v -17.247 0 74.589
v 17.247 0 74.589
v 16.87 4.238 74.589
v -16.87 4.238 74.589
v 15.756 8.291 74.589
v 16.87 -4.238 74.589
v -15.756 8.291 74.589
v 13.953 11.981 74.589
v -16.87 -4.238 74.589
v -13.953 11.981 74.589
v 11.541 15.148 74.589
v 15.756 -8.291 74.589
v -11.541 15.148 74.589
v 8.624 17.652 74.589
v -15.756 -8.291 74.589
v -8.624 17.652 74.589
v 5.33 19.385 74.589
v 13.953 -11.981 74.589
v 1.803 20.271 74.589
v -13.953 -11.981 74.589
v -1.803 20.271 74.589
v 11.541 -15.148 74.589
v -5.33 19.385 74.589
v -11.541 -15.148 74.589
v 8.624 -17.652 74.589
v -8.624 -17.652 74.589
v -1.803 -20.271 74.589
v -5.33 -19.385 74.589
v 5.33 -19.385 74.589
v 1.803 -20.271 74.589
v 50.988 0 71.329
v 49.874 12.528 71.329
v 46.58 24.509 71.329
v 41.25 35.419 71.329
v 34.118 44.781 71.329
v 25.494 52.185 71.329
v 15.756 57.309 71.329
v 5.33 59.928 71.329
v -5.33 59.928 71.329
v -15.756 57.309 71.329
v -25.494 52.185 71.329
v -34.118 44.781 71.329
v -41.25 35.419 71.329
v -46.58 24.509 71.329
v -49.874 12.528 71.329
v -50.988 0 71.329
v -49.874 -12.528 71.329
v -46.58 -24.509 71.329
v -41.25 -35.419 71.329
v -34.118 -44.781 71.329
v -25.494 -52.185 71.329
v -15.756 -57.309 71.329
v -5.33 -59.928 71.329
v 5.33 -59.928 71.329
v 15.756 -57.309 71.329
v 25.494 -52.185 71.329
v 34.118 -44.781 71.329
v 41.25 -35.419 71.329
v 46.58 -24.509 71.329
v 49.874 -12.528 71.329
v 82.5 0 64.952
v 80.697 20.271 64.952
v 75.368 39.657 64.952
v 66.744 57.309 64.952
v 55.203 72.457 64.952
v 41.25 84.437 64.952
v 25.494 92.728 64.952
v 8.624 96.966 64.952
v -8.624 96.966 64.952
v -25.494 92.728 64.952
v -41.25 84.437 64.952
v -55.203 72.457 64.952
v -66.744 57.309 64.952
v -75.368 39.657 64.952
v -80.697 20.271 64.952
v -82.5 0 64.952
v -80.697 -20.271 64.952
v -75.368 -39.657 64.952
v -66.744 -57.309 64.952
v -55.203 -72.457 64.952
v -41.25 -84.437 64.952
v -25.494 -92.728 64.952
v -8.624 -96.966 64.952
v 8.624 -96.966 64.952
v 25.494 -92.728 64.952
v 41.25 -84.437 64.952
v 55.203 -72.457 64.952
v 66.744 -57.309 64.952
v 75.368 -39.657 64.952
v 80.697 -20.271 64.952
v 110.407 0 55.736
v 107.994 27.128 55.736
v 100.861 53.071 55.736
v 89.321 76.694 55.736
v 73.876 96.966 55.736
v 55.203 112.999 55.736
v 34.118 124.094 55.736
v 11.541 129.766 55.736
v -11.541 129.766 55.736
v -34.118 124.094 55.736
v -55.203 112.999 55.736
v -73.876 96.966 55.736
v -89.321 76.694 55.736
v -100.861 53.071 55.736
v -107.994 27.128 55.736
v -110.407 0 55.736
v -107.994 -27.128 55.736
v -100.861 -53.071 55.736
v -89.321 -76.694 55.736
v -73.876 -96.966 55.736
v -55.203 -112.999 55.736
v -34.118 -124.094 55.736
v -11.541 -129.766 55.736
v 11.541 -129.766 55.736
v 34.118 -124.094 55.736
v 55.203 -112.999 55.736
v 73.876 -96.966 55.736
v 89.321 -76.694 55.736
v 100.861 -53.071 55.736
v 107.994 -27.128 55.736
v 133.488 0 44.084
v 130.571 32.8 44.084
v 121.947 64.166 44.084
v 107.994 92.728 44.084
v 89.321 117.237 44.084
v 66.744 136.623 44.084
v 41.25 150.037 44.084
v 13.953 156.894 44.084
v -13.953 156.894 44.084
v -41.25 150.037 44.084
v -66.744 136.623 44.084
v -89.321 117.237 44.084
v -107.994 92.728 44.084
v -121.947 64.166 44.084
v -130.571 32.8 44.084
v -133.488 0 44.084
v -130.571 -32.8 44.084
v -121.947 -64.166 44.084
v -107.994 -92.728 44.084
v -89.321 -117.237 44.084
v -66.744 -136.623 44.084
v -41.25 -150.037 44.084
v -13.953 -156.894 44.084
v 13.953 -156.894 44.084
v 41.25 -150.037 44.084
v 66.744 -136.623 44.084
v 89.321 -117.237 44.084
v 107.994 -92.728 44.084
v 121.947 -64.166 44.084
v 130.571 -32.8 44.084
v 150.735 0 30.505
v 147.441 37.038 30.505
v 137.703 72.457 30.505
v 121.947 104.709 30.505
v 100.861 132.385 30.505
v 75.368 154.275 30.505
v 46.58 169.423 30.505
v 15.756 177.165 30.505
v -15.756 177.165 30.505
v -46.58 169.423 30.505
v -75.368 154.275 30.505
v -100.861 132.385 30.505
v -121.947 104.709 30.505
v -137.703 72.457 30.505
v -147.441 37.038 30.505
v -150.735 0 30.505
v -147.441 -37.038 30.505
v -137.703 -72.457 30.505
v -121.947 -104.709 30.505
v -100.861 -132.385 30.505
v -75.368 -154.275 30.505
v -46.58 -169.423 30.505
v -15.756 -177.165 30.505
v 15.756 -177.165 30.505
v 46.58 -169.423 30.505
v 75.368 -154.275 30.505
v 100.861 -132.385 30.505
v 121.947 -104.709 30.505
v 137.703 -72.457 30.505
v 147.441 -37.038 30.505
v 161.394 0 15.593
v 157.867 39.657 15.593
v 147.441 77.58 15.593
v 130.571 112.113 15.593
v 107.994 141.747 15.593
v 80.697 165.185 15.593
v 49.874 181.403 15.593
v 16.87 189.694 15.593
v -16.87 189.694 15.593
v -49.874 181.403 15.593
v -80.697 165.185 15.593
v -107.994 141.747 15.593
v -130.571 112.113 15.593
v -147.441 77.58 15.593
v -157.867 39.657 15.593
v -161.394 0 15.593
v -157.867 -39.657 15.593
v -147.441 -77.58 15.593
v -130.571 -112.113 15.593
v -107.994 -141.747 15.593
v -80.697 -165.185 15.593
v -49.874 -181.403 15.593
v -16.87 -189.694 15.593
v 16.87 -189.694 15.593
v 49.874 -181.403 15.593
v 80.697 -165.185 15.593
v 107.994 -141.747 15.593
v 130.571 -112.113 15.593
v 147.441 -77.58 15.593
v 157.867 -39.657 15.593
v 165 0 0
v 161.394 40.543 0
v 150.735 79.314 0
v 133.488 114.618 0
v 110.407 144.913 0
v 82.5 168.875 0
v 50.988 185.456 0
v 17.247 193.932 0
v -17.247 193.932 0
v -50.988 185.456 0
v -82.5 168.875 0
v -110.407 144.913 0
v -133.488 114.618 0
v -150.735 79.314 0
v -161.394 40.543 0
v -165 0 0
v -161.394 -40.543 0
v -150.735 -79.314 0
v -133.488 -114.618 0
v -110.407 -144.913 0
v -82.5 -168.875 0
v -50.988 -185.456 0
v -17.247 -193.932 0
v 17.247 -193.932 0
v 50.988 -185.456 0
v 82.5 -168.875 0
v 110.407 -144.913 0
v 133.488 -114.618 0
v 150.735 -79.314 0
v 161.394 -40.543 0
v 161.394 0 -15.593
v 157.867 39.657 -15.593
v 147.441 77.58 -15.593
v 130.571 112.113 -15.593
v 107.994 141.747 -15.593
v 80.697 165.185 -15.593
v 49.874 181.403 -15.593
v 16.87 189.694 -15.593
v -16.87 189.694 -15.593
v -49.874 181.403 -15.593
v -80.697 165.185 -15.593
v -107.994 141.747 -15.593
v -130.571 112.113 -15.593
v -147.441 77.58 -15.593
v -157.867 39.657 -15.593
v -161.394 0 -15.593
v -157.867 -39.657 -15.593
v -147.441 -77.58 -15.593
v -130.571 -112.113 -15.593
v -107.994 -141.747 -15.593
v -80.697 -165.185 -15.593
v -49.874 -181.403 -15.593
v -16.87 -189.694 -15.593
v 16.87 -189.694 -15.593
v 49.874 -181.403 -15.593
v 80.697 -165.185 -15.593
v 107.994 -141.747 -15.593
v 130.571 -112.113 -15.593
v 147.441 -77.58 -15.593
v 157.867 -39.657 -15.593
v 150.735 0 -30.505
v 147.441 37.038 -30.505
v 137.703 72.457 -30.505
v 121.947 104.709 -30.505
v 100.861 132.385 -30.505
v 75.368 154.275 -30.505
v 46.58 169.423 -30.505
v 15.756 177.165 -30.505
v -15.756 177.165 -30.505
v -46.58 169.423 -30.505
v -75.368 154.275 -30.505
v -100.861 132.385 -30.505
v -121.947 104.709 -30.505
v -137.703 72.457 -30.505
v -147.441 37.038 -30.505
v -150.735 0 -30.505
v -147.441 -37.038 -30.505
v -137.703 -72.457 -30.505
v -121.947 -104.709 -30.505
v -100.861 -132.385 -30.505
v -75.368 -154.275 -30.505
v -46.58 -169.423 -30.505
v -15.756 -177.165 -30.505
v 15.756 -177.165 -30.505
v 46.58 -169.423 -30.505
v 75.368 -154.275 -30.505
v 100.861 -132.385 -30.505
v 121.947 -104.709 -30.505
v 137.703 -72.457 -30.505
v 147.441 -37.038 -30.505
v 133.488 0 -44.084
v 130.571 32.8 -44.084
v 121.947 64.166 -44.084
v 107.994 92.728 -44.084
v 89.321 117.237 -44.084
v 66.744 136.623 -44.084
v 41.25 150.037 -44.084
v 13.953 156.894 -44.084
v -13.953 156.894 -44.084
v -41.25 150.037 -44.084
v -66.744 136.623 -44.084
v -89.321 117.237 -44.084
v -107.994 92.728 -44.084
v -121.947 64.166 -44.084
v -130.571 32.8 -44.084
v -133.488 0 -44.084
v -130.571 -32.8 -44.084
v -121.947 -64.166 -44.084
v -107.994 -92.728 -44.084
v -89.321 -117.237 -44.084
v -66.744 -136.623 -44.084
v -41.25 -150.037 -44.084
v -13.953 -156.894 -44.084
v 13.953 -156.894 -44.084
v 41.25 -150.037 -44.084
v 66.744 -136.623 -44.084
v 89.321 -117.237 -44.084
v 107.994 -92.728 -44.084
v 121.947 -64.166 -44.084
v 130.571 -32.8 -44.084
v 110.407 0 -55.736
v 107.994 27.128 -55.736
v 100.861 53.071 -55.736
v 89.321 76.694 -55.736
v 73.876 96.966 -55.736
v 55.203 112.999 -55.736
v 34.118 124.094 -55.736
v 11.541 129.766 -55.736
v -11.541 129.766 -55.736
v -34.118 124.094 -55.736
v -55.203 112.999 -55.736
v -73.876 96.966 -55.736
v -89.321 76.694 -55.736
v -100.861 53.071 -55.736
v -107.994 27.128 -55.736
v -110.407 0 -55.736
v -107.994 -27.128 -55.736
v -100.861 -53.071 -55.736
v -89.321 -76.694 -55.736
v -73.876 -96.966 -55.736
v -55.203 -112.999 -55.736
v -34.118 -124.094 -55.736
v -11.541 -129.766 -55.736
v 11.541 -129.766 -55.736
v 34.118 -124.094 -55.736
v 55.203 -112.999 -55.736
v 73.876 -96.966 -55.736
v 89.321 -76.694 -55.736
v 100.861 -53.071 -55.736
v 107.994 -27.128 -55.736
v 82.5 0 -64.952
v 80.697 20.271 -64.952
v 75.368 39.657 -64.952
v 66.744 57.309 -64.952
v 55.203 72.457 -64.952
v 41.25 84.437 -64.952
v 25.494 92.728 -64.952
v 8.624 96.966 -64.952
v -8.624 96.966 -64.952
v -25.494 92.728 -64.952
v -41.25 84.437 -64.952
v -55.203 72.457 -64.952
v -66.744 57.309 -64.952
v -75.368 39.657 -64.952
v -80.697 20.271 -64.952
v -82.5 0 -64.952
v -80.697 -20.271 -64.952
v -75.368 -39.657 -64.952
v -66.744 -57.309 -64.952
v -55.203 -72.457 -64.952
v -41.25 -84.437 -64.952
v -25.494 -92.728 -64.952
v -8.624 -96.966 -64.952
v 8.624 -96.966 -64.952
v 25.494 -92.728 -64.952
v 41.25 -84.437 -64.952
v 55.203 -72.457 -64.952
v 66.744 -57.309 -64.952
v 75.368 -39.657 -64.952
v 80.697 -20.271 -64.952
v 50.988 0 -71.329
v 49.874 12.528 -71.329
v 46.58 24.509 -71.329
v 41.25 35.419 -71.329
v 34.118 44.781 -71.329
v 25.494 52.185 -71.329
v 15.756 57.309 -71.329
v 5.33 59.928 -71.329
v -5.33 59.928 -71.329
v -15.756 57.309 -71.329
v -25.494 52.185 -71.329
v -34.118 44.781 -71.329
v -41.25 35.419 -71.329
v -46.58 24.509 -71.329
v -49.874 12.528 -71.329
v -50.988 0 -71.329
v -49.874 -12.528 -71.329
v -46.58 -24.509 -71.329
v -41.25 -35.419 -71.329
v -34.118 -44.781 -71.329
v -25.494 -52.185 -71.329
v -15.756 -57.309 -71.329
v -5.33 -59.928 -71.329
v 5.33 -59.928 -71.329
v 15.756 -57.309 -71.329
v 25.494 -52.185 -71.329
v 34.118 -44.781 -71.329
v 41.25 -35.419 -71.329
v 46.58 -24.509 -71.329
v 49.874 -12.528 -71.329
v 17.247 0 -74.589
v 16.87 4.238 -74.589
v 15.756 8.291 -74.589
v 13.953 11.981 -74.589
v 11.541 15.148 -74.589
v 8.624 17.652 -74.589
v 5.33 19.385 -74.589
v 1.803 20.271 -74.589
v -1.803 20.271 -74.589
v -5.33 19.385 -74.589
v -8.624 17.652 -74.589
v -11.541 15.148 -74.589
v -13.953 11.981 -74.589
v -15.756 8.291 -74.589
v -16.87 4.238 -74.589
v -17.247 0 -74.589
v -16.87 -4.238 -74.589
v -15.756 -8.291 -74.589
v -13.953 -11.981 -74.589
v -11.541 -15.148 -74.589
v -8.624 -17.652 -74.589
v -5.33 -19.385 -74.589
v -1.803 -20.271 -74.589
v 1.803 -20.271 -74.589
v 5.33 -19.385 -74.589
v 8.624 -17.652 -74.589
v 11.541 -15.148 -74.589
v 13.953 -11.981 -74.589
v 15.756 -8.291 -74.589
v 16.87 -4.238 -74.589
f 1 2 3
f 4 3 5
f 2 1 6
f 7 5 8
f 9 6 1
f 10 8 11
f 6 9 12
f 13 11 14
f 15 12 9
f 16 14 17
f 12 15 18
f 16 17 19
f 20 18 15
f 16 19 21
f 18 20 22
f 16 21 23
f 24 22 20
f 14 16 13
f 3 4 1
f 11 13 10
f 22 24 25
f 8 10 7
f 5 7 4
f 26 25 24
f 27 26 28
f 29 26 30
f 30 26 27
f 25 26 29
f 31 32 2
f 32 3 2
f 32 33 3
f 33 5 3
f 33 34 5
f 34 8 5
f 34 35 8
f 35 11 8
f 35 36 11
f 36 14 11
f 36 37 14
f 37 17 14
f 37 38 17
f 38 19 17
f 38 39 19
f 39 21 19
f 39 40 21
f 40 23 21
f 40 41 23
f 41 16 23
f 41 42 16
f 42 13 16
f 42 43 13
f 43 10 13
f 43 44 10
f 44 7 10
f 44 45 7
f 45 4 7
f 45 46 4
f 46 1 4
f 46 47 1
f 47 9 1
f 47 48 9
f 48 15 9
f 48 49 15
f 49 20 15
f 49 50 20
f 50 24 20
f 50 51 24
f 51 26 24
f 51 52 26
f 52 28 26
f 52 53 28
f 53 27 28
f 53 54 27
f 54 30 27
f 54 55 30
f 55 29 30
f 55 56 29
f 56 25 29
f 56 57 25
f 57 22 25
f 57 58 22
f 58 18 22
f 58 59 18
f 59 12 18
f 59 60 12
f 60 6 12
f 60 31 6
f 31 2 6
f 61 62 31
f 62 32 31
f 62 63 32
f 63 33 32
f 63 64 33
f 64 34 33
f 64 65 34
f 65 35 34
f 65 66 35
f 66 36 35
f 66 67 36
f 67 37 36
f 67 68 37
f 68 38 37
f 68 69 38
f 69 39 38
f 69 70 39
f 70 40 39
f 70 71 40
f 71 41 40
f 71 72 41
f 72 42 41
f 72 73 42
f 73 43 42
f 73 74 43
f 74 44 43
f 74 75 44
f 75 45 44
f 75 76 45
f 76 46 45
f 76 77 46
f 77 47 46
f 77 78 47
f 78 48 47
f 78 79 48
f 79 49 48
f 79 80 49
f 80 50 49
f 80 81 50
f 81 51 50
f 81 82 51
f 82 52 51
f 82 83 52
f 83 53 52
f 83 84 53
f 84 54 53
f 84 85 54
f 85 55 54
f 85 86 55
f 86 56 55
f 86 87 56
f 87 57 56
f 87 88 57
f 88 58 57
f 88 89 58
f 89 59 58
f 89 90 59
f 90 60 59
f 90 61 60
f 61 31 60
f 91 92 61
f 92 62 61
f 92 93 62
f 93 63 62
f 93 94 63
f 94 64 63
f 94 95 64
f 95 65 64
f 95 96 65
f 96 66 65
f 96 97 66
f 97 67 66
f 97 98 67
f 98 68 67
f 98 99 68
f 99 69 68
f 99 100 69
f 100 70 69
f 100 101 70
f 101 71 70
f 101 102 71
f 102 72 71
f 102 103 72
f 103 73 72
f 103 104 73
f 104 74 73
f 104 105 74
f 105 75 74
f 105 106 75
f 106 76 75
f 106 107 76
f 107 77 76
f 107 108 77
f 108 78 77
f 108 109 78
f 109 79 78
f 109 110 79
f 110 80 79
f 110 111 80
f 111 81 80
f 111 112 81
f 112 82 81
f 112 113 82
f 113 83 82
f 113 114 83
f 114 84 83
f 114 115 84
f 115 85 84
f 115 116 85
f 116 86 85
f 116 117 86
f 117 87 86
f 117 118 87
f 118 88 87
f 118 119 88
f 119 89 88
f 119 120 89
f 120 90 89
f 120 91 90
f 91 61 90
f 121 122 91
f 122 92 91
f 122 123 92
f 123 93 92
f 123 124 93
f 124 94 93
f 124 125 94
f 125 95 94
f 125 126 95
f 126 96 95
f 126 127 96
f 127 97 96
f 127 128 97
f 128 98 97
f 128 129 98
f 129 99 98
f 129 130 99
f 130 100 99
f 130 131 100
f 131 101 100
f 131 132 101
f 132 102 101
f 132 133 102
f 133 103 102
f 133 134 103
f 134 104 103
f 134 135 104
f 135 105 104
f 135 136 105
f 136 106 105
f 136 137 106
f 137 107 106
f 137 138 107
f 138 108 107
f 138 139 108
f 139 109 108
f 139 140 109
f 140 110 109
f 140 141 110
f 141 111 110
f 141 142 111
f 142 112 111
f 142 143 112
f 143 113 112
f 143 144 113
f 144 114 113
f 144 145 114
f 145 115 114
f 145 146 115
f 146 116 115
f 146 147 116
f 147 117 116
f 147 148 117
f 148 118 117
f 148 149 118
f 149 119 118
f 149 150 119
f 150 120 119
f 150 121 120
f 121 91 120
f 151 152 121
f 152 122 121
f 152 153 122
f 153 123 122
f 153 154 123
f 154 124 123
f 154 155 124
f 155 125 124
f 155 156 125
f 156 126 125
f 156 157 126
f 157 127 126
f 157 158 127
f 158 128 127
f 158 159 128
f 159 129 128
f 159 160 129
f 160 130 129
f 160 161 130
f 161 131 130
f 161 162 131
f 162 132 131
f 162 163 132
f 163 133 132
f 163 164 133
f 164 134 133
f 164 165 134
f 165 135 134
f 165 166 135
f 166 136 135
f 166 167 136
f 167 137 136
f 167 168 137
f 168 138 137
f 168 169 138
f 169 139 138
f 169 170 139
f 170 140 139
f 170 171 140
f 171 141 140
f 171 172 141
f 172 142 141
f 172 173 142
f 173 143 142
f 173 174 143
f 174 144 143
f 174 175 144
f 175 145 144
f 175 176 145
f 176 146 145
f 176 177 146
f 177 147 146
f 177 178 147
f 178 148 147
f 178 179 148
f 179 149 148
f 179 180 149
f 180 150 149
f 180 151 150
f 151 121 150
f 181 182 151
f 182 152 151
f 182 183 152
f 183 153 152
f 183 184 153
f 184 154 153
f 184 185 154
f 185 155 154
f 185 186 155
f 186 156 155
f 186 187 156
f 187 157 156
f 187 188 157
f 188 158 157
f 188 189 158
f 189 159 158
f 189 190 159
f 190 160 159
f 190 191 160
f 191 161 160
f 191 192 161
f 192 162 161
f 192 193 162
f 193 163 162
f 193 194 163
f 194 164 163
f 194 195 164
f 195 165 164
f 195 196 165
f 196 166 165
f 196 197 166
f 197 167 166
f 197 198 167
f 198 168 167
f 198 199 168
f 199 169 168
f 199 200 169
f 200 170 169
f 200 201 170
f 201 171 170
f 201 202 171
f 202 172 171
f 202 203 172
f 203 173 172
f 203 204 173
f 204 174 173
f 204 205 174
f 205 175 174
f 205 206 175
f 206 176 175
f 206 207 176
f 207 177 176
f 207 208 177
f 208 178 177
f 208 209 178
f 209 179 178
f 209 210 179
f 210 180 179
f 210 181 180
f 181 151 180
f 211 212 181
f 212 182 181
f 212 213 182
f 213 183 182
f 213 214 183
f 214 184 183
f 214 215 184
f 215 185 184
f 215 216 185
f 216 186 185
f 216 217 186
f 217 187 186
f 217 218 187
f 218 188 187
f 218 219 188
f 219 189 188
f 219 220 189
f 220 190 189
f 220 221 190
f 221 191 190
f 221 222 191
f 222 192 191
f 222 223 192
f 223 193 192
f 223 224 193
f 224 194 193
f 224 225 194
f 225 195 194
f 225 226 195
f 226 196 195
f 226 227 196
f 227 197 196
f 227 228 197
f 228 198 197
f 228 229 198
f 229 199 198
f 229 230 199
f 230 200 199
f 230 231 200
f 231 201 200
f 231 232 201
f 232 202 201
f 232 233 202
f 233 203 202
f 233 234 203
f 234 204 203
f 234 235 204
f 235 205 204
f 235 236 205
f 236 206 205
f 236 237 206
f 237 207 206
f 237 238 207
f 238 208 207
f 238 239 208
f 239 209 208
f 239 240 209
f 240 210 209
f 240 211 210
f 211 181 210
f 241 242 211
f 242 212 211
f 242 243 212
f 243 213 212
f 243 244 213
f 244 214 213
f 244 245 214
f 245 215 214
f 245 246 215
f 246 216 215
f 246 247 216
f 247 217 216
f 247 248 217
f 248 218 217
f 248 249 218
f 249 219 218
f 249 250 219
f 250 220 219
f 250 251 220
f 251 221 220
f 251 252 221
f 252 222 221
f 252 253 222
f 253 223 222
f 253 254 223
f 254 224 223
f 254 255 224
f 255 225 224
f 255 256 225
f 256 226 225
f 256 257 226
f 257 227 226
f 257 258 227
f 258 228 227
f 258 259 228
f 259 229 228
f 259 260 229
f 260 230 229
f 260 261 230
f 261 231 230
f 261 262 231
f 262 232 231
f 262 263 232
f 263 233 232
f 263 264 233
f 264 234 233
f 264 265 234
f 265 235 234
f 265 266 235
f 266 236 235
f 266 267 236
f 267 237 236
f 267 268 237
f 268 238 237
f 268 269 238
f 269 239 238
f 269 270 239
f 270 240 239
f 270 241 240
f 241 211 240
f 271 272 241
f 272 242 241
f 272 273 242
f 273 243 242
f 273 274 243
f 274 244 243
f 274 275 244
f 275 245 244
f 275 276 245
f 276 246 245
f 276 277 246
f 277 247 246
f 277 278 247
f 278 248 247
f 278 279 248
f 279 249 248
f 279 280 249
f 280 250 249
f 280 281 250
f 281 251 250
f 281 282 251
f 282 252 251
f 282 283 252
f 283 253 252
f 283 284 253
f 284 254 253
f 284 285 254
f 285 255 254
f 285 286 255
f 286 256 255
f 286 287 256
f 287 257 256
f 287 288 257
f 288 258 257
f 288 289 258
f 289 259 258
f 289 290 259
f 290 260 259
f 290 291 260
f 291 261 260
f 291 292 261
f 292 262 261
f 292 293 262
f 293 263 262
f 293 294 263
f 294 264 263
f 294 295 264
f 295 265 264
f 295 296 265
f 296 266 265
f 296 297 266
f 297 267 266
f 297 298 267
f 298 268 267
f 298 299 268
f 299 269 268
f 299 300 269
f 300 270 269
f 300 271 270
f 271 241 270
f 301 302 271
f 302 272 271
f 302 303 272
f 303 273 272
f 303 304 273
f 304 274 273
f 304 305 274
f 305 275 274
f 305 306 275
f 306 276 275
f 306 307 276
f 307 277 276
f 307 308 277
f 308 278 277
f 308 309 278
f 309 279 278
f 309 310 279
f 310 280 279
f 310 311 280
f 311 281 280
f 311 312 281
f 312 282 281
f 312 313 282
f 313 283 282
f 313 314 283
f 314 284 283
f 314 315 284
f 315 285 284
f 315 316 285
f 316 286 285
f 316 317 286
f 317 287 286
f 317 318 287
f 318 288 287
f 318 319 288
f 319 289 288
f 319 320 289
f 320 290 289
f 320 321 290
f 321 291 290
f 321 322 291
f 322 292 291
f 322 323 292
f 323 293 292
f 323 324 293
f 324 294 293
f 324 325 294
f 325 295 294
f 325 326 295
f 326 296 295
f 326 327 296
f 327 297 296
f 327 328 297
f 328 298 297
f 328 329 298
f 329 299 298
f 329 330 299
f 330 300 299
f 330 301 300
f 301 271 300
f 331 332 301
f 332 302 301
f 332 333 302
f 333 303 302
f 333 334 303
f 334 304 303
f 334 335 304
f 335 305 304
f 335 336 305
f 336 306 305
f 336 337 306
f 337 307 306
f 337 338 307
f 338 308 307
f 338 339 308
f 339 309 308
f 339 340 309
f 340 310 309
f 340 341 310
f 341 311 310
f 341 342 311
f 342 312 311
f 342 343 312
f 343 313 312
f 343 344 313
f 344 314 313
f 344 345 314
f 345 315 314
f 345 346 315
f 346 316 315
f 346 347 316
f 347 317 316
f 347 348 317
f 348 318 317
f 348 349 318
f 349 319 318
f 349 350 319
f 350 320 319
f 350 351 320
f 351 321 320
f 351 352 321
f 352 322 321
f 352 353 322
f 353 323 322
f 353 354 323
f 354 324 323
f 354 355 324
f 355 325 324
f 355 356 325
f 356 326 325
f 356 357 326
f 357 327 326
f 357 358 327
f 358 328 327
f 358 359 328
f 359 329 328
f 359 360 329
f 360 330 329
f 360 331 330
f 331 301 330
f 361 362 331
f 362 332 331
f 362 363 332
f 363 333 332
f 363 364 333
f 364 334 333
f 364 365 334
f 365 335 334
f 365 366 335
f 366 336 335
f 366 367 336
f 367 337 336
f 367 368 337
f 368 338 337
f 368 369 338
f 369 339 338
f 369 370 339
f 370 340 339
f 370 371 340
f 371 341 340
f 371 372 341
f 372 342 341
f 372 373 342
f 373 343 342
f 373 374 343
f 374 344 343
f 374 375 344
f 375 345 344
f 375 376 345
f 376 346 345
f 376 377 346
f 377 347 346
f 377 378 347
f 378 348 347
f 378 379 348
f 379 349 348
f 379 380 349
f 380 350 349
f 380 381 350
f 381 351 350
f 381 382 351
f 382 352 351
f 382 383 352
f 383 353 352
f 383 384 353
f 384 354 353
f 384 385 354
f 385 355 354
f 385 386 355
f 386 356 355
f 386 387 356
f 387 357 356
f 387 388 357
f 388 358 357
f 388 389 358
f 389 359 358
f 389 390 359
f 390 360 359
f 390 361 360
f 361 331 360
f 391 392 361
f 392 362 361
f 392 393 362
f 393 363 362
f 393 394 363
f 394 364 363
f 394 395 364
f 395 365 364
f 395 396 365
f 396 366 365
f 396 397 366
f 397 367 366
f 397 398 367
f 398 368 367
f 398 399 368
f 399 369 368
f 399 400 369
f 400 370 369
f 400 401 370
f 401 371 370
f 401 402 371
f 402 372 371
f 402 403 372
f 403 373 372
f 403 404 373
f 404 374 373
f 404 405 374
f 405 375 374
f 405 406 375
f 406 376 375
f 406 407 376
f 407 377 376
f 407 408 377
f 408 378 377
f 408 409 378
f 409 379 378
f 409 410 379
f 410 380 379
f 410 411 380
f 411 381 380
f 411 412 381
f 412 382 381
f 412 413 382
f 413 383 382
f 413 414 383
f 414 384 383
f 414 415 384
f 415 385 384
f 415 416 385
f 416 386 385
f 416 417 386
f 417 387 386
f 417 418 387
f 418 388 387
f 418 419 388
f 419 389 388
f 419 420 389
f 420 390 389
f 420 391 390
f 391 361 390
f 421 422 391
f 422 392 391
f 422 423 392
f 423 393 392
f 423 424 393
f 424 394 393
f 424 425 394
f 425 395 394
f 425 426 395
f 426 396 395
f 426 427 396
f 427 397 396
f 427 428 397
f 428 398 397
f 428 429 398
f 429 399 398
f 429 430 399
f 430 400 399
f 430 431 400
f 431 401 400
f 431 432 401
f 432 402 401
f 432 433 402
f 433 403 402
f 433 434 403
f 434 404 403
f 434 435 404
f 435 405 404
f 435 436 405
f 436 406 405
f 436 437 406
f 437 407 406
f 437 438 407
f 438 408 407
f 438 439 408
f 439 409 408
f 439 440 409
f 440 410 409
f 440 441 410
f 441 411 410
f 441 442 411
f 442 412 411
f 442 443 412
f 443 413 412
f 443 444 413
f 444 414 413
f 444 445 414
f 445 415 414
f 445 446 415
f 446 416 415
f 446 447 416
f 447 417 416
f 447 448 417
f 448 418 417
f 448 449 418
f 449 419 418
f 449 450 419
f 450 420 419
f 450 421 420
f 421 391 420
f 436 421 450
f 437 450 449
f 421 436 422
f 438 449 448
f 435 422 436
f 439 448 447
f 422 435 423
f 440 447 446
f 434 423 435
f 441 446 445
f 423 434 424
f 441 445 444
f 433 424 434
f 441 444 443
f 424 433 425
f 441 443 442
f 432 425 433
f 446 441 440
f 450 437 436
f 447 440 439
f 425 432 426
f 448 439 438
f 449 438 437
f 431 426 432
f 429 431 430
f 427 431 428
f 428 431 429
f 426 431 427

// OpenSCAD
// Generated by SolidPython 1.0.1 on 2020-07-29 00:46:49


scale(v = [11, 13, 5]) {
	sphere(r = 15);
}
/***********************************************
*********      SolidPython code:      **********
************************************************
 
# import packages: SolidPython
from solid import *
from solid.utils import *
from itertools import chain, combinations, permutations


class Resize:

    def __init__(self, scad_file):
        self.scad_file = scad_file
        #self.scad_file = import_scad(scad_file)
        # cone/cylinder param:
        self.r1 = 0
        self.r2 = 0
        self.h = 0
        # rectangular prism param:
        self.w = 0
        self.l = 0
        # ellipse param:
        self.r = 0

    # import OpenScad code (file name corresponds to shape)


    # classify shape + parameters
    def assign(self, param1, param2, param3):
        if self.scad_file == 'cone.scad':
            self.r1 = param1
            self.r2 = param2
            self.h = param3
        elif self.scad_file == 'cylinder.scad':
            self.r1 = param1
            self.r2 = param2
            self.h = param3
        elif self.scad_file == 'rectangularPrism.scad':
            self.h = param1
            self.l = param2
            self.w = param3
        else:
            self.r = param1
            self.h = param2

    # resize parameters
    def iterate(self):
        x = range(3, 20, 2)
        i = 1
        if self.scad_file == 'cone.scad':
            tempList = list(permutations(x, 2))
            for temp in tempList:
                param1 = temp[0]
                param2 = temp[1]
                filepath = 'produced_scad_files/' + 'cone' + str(param1) + '_' + str(param2) + '_' + '.scad'
                scad_render_to_file(cylinder(h=param1, r1=param2, r2=0), filepath)

        elif self.scad_file == 'cylinder.scad':
            tempList = list(permutations(x, 3))
            for temp in tempList:
                param1 = temp[0]
                param2 = temp[1]
                filepath = 'produced_scad_files/' + 'cylinder' + str(param1) + '_' + str(param2) + '_' + '.scad'
                scad_render_to_file(cylinder(h=param1, r1=param2, r2=param2), filepath)

        elif self.scad_file == 'rectangularPrism.scad':
            tempList = list(permutations(x, 3))
            for temp in tempList:
                param1 = temp[0]
                param2 = temp[1]
                param3 = temp[2]
                filepath = 'produced_scad_files/' + 'rectangularPrism' + str(param1) + '_' + str(param2) + '_' + str(
                    param3) + '.scad'
                scad_render_to_file(cube(size=(param1, param2, param3)), filepath)

        elif self.scad_file == 'ellipse.scad':
            tempList = list(permutations(x, 4))
            for temp in tempList:
                param1 = temp[0]
                param2 = temp[1]
                param3 = temp[2]
                param4 = temp[3]
                filepath = 'produced_scad_files/' + 'ellipse' + str(param1) + '_' + str(param2) + '_' + str(param3) + '_' + str(param4) + '.scad'
                scad_render_to_file(scale([param1, param2, param3])(sphere(r=param4)), filepath)

    def render_to_scadfile(self):
        scad_render_to_file(scad, 'example.scad') 
 
************************************************/
